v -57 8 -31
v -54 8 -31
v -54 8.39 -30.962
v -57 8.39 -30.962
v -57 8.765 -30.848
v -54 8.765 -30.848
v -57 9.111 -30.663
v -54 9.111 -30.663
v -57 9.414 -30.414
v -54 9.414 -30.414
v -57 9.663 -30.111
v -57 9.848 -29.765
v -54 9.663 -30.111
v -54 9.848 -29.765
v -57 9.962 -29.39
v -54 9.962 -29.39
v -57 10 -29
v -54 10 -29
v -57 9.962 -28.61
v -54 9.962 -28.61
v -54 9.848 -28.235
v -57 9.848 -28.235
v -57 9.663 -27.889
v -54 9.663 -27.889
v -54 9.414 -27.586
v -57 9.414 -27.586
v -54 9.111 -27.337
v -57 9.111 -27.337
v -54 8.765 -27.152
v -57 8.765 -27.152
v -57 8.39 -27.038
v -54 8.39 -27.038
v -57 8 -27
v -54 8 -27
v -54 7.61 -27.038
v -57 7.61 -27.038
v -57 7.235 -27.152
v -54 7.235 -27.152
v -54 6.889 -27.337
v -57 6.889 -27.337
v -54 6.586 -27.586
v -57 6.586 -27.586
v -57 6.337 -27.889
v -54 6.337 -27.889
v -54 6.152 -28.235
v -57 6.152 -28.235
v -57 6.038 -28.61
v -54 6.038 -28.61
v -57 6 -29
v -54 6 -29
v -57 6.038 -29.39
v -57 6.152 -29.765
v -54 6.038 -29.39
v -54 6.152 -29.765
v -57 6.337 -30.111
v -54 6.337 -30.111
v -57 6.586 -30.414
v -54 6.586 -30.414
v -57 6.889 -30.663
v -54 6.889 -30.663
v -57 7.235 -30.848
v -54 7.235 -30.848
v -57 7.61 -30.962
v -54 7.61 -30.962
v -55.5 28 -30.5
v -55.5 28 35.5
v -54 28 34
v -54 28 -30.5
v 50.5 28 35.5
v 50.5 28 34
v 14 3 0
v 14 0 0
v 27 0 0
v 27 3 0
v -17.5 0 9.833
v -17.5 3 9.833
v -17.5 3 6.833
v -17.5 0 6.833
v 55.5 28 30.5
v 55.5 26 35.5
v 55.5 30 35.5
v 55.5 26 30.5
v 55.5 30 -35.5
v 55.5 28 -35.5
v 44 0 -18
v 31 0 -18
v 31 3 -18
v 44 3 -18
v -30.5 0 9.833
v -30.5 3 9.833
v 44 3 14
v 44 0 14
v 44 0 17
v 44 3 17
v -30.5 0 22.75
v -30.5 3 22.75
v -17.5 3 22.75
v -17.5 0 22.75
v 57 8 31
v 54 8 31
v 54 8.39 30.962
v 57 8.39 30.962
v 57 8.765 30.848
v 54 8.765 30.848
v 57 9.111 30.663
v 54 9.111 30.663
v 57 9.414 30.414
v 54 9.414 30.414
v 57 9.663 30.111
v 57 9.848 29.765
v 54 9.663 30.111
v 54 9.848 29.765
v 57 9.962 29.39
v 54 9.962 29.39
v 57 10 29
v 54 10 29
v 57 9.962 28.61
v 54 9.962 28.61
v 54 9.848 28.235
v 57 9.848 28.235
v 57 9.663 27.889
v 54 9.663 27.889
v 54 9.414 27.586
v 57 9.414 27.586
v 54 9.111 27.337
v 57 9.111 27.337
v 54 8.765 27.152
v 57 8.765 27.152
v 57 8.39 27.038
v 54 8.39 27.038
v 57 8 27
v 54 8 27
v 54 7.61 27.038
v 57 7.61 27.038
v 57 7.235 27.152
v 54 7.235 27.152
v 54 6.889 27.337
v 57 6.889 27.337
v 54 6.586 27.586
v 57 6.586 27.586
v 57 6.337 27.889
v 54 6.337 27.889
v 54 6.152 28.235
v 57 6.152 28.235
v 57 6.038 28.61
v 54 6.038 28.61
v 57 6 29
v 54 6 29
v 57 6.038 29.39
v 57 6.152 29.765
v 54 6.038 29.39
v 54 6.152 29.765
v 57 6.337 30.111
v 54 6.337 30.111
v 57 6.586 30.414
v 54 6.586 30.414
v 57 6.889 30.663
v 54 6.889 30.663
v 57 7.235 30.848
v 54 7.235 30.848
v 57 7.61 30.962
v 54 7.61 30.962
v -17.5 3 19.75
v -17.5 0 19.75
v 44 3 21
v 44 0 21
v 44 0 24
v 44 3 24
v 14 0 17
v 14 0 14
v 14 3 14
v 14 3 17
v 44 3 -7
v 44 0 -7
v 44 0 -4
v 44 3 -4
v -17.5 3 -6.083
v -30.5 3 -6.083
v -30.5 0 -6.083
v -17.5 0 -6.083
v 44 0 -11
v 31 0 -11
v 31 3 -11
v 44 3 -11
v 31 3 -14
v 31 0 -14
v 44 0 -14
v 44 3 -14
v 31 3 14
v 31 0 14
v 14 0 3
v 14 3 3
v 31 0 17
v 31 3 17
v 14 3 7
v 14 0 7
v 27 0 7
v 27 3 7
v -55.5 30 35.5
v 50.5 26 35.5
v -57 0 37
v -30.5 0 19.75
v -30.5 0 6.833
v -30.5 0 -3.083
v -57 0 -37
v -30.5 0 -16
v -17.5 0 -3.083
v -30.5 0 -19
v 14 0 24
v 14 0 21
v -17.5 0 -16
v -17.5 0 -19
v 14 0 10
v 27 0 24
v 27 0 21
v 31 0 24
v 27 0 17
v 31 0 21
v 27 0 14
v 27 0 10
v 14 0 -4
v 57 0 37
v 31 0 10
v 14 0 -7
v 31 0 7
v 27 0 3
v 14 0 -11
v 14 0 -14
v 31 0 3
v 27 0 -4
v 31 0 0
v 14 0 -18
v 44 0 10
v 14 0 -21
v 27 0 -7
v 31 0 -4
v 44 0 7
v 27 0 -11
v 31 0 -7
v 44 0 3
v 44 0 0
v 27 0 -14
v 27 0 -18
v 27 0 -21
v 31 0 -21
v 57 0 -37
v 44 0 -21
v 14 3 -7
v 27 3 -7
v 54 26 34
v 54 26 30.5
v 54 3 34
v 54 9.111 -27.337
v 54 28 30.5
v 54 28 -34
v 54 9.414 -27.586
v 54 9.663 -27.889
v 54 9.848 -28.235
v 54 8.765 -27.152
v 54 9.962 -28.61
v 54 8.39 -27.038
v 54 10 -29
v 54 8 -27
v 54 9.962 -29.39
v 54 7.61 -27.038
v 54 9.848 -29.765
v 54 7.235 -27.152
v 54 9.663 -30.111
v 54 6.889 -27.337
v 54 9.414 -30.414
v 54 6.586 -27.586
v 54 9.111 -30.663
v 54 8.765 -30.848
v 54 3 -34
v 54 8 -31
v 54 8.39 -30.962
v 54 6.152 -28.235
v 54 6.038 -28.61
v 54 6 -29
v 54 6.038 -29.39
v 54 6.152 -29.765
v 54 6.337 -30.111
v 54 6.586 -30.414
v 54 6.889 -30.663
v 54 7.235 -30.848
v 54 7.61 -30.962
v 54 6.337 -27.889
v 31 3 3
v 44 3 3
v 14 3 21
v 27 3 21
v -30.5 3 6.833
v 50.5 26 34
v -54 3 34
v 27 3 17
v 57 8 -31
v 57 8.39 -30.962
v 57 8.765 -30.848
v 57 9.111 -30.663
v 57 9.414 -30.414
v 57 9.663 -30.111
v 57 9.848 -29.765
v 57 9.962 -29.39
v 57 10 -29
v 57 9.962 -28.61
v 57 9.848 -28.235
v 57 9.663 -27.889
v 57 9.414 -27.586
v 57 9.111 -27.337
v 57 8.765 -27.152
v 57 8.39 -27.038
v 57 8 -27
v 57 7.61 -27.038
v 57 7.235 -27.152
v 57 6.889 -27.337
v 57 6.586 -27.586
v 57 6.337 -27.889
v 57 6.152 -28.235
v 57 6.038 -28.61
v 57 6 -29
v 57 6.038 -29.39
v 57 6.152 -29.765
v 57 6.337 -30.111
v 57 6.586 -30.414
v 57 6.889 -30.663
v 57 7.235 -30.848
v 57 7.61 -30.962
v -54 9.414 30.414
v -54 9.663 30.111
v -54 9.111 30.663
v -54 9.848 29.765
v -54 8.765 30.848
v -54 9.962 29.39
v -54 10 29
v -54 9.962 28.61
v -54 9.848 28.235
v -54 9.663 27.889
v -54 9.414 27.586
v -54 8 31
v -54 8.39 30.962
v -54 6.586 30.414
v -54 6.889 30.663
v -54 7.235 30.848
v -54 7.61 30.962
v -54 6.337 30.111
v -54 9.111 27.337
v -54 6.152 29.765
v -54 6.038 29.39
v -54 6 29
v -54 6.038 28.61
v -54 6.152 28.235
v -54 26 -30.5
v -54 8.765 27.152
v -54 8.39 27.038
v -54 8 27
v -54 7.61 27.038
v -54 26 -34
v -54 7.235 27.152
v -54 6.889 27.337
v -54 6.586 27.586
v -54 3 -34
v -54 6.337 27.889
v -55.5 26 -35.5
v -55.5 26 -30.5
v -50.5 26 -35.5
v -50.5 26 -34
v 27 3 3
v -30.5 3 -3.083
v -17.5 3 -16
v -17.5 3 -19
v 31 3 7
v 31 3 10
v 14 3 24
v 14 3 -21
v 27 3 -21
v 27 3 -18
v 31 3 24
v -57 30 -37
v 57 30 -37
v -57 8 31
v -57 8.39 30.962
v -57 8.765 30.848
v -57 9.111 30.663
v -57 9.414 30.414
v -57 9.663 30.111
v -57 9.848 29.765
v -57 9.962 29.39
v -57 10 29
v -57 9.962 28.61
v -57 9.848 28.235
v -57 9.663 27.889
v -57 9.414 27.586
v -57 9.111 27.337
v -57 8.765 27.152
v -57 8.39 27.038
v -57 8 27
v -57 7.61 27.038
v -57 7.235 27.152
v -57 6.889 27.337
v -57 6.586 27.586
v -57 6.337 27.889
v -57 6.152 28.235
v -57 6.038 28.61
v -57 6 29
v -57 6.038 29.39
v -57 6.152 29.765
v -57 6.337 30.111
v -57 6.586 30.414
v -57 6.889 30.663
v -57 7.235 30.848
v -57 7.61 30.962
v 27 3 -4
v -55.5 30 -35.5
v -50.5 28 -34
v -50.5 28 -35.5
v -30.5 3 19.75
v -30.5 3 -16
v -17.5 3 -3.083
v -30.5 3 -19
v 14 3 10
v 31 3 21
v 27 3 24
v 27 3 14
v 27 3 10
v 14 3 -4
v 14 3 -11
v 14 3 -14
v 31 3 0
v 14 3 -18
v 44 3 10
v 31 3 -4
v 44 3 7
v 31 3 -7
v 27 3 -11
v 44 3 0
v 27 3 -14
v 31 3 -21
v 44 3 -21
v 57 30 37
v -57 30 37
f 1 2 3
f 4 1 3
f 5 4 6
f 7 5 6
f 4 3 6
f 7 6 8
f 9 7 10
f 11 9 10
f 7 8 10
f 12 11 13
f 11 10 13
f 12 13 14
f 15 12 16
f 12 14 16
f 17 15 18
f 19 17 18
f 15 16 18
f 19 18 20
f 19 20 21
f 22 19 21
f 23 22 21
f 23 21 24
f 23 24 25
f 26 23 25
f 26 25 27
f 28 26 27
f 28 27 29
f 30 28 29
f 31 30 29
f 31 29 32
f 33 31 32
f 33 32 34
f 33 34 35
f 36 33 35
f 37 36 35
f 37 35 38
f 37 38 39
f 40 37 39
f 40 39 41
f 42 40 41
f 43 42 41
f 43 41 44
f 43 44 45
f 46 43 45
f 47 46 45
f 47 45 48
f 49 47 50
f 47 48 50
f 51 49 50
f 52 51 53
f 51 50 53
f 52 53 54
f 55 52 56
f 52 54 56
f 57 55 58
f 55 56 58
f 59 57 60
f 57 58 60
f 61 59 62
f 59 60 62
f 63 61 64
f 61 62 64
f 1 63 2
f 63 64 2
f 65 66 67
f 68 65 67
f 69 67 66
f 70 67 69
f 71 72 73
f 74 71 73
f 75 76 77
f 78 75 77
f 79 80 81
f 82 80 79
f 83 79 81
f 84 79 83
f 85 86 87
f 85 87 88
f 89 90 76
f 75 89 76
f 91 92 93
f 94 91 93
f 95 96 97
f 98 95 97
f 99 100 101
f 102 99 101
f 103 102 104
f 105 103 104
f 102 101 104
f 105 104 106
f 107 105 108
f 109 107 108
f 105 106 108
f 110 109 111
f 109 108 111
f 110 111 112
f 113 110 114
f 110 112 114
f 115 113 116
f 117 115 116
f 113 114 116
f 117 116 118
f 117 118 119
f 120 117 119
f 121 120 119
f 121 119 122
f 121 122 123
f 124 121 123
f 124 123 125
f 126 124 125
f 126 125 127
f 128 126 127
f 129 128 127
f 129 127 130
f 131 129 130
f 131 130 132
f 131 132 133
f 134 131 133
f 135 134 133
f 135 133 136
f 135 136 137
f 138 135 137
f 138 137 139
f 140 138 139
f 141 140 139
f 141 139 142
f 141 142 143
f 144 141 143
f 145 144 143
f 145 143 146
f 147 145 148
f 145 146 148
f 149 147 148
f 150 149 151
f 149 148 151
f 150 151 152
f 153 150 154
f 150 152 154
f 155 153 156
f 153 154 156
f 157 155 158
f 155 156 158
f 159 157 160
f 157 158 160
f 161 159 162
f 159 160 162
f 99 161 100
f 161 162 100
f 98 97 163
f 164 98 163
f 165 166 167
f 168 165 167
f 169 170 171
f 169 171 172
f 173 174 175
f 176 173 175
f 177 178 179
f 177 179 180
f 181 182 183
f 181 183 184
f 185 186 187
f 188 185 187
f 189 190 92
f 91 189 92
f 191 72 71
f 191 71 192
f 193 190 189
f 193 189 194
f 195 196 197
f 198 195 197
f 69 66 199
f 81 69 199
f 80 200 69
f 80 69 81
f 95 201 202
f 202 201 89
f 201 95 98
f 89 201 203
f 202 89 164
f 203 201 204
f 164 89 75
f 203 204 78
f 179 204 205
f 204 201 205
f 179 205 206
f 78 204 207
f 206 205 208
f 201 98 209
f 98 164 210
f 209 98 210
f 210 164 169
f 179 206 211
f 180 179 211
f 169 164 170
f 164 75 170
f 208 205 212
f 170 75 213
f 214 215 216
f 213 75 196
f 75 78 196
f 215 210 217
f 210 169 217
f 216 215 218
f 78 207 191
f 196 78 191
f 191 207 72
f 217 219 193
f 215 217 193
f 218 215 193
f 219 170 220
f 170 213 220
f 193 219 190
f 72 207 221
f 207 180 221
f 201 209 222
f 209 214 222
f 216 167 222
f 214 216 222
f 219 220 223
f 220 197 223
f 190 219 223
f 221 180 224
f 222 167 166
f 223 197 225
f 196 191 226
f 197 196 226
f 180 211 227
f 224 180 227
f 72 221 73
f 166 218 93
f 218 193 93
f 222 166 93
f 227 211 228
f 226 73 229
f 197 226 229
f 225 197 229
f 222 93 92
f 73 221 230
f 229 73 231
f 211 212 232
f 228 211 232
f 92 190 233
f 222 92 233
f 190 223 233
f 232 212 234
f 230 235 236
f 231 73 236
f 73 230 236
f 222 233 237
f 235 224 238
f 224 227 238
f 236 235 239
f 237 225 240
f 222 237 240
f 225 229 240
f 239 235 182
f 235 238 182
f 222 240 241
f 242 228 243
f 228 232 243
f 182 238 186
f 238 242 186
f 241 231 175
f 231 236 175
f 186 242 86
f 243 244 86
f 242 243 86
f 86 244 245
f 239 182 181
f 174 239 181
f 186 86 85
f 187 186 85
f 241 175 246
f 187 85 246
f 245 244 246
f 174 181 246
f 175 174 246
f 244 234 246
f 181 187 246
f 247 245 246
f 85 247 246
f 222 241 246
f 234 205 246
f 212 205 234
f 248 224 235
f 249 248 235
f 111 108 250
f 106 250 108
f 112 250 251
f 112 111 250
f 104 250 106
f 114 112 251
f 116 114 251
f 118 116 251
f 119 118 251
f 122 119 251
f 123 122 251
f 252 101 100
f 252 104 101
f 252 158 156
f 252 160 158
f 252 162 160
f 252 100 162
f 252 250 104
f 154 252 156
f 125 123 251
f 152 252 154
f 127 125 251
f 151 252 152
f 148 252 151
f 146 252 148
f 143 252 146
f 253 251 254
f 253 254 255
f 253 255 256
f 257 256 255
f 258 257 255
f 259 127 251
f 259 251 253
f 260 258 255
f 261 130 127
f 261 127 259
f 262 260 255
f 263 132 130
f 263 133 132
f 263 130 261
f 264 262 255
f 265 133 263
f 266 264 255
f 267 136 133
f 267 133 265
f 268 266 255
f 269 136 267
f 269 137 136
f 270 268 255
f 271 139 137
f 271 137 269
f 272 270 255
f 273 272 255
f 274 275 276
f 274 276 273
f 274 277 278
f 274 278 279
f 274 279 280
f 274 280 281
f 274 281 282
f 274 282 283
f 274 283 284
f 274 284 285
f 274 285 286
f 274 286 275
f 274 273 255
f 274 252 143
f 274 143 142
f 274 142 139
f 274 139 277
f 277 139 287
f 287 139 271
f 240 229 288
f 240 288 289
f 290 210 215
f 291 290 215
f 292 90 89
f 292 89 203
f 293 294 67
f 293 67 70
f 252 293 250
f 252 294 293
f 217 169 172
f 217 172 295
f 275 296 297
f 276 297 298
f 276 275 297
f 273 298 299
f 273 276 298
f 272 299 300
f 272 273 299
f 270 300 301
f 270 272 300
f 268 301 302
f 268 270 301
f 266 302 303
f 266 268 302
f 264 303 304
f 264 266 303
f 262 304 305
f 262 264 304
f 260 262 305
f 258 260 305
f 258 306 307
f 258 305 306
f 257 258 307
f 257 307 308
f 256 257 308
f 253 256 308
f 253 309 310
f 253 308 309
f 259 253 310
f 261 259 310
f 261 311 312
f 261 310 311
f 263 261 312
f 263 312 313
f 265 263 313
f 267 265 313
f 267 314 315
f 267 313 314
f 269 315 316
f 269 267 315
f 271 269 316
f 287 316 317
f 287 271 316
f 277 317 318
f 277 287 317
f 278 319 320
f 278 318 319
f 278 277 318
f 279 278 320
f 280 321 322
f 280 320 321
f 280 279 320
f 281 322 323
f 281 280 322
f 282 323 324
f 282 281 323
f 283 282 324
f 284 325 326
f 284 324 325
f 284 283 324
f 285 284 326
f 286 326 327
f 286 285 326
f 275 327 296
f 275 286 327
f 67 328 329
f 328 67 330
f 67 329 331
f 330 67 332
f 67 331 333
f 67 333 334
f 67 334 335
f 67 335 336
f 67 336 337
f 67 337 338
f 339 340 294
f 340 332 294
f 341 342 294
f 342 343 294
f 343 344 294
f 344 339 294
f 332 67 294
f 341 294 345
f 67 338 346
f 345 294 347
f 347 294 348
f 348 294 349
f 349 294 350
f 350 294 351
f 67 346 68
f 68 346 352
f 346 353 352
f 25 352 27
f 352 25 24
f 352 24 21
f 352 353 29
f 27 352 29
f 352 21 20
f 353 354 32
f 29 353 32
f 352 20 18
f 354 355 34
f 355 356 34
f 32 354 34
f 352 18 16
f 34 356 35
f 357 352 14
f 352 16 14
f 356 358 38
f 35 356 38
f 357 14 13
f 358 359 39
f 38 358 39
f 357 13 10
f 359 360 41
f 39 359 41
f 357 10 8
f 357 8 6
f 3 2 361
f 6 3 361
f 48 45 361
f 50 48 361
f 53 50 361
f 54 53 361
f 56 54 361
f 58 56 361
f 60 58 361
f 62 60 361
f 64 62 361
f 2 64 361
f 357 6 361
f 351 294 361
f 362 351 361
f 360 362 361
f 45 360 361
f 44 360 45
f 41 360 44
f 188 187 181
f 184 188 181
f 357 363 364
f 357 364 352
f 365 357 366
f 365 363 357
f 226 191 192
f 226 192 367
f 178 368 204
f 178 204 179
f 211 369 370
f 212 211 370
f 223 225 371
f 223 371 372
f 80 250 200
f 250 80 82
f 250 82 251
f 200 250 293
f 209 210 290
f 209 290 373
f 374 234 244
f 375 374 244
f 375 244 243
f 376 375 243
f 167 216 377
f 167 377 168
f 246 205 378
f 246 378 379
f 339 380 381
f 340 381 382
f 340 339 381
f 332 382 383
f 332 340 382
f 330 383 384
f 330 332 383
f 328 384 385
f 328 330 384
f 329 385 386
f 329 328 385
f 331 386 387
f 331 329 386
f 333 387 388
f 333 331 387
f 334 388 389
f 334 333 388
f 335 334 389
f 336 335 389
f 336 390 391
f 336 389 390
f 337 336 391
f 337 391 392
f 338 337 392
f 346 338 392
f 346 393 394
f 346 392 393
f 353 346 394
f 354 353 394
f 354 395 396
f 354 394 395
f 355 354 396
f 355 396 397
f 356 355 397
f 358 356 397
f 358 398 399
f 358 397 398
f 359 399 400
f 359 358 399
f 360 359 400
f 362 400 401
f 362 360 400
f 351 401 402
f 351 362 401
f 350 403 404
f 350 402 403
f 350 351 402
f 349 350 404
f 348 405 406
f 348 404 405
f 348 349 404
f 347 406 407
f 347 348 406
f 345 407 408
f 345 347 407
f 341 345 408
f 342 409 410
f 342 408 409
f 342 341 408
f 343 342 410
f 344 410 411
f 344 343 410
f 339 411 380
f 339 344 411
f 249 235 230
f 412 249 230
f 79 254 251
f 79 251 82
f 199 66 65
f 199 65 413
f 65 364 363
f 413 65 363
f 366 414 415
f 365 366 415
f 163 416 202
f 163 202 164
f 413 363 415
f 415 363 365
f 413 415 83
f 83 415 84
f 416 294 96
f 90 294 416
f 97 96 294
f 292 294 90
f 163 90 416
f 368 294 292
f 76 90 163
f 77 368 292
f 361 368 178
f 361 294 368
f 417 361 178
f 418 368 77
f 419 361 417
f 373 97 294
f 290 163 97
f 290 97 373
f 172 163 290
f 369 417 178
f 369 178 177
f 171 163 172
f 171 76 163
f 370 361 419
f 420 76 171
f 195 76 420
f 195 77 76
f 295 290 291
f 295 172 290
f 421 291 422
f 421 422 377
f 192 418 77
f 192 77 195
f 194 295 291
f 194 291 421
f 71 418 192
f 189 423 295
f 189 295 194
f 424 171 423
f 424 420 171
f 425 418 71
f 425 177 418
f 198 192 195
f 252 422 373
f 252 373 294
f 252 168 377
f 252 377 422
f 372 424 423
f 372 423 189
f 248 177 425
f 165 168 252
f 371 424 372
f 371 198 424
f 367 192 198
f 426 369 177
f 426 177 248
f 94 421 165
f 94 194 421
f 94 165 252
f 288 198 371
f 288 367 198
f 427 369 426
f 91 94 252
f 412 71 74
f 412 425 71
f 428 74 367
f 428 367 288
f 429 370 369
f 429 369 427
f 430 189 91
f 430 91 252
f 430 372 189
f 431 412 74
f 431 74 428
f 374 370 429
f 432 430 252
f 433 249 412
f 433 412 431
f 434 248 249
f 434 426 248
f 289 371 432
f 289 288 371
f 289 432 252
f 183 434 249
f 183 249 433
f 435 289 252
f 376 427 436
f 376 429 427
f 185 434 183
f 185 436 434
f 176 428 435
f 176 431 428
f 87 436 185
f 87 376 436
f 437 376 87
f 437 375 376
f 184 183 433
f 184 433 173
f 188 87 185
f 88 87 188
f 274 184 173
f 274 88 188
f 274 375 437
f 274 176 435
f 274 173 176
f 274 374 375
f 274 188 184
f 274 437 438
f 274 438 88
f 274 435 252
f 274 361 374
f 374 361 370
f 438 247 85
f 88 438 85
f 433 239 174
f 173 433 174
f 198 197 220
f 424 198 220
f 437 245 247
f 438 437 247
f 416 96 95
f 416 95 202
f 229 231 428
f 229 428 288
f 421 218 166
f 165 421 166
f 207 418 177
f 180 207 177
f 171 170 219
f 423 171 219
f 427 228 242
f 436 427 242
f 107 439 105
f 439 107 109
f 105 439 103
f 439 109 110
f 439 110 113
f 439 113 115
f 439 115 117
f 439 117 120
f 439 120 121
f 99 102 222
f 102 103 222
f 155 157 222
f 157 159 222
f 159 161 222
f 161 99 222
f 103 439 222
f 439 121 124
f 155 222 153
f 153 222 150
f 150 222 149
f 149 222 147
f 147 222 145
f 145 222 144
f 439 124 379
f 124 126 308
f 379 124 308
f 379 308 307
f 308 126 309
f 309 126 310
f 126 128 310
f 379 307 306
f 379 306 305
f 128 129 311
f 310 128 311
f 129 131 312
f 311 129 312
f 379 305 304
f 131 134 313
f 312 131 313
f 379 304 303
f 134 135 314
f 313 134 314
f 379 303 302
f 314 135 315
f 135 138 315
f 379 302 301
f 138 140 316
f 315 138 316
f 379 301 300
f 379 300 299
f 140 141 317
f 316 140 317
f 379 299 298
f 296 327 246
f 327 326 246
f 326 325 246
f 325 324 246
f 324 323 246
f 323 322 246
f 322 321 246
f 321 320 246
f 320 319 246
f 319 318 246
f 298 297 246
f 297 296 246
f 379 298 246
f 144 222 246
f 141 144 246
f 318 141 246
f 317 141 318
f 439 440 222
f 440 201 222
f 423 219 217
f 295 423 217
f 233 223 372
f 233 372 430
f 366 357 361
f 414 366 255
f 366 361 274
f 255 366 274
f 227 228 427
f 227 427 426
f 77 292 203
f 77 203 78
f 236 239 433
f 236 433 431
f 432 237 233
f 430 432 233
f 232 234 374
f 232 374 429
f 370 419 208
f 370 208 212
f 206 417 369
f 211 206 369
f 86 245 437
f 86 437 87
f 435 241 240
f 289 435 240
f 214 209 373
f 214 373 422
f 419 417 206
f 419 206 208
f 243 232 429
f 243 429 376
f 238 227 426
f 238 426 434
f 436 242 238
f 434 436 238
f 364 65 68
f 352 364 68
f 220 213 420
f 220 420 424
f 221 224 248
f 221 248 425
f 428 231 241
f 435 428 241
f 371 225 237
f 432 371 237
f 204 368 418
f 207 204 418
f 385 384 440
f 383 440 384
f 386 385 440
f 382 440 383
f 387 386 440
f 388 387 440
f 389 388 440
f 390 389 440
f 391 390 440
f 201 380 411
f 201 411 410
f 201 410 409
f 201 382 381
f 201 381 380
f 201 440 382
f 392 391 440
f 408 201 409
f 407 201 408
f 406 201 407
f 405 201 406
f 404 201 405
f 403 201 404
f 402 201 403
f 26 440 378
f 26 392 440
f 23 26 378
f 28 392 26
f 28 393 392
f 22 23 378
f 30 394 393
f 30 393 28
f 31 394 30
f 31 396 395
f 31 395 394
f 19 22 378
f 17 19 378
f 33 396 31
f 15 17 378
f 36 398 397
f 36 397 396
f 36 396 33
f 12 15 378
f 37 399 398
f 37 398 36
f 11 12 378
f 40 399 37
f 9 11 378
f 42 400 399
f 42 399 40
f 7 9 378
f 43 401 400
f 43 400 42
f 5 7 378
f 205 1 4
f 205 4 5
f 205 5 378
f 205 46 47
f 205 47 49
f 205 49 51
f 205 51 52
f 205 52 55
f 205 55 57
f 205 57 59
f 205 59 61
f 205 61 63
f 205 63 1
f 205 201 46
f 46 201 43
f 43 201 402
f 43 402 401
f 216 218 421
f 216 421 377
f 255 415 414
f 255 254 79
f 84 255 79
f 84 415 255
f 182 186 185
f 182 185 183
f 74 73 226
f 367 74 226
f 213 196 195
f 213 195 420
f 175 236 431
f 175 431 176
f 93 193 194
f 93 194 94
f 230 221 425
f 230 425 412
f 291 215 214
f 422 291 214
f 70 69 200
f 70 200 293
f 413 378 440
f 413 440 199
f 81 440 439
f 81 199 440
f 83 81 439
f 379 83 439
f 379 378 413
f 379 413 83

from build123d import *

# Parameters (mm, degrees)
SKETCH1_W                = 108
SKETCH1_H                = 68
BOSS_EXTRUDE1_DEPTH      = 3
SKETCH2_W                = 114
SKETCH2_H                = 74
SKETCH2_W_2              = 108
SKETCH2_H_2              = 68
BOSS_EXTRUDE2_DEPTH      = 25
BOSS_EXTRUDE2_DEPTH_BACK = 3
SKETCH4_W                = 114
SKETCH4_H                = 74
SKETCH4_W_2              = 111
SKETCH4_H_2              = 71
BOSS_EXTRUDE3_DEPTH      = 2
SKETCH5_R                = 2
CUT_EXTRUDE1_DEPTH       = 4
SKETCH6_W                = 13
SKETCH6_H                = 3
CUT_EXTRUDE2_DEPTH       = 31
MIRROR2_COPY_1_SKETCH_R  = 2
MIRROR2_COPY_1_DEPTH     = 4
SKETCH7_W                = 13
SKETCH7_H                = 3
CUT_EXTRUDE3_DEPTH       = 10
CUT_EXTRUDE4_DEPTH       = 2


with BuildPart() as part:
    # Sketch1 → Boss-Extrude1 (new body)
    with BuildSketch(Plane(origin=(0, 0, 0), x_dir=(1, 0, 0), z_dir=(0, 1, 0))):
        Rectangle(SKETCH1_W, SKETCH1_H)
    extrude(amount=BOSS_EXTRUDE1_DEPTH)

    # Sketch2 → Boss-Extrude2 (add, two sides)
    with BuildSketch(Plane(origin=(0, 3, 0), x_dir=(1, 0, 0), z_dir=(0, 1, 0))) as boss_extrude2_sk:
        Rectangle(SKETCH2_W, SKETCH2_H)
        Rectangle(SKETCH2_W_2, SKETCH2_H_2, mode=Mode.SUBTRACT)
    extrude(amount=BOSS_EXTRUDE2_DEPTH)
    extrude(boss_extrude2_sk.sketch, amount=-BOSS_EXTRUDE2_DEPTH_BACK)

    # Sketch4 → Boss-Extrude3 (add)
    with BuildSketch(Plane(origin=(0, 28, 0), x_dir=(1, 0, 0), z_dir=(0, 1, 0))):
        Rectangle(SKETCH4_W, SKETCH4_H)
        Rectangle(SKETCH4_W_2, SKETCH4_H_2, mode=Mode.SUBTRACT)
    extrude(amount=BOSS_EXTRUDE3_DEPTH)

    # Sketch5 → Cut-Extrude1 (cut, through all)
    with BuildSketch(Plane(origin=(-54, 0, 0), x_dir=(0, 0, -1), z_dir=(1, 0, 0))):
        with Locations((29, 8)):
            Circle(SKETCH5_R)
    cut_extrude1 = extrude(amount=-CUT_EXTRUDE1_DEPTH, mode=Mode.SUBTRACT)

    # Sketch6 → Cut-Extrude2 (cut, through all)
    with BuildSketch(Plane.XZ):
        with Locations((20.5, 22.5)):
            Rectangle(SKETCH6_W, SKETCH6_H)
        with Locations((37.5, 22.5)):
            Rectangle(SKETCH6_W, SKETCH6_H)
        with Locations((20.5, 15.5)):
            Rectangle(SKETCH6_W, SKETCH6_H)
        with Locations((37.5, 15.5)):
            Rectangle(SKETCH6_W, SKETCH6_H)
        with Locations((20.5, 8.5)):
            Rectangle(SKETCH6_W, SKETCH6_H)
        with Locations((37.5, 8.5)):
            Rectangle(SKETCH6_W, SKETCH6_H)
        with Locations((20.5, 1.5)):
            Rectangle(SKETCH6_W, SKETCH6_H)
        with Locations((37.5, 1.5)):
            Rectangle(SKETCH6_W, SKETCH6_H)
        with Locations((20.5, -5.5)):
            Rectangle(SKETCH6_W, SKETCH6_H)
        with Locations((37.5, -5.5)):
            Rectangle(SKETCH6_W, SKETCH6_H)
        with Locations((20.5, -12.5)):
            Rectangle(SKETCH6_W, SKETCH6_H)
        with Locations((37.5, -12.5)):
            Rectangle(SKETCH6_W, SKETCH6_H)
        with Locations((20.5, -19.5)):
            Rectangle(SKETCH6_W, SKETCH6_H)
        with Locations((37.5, -19.5)):
            Rectangle(SKETCH6_W, SKETCH6_H)
    extrude(amount=-CUT_EXTRUDE2_DEPTH, mode=Mode.SUBTRACT)

    # Mirror1: Cut-Extrude1 across plane
    add(cut_extrude1.mirror(Plane.XY), mode=Mode.SUBTRACT)

    # Mirror2: Cut-Extrude1 across plane
    add(cut_extrude1.mirror(Plane(origin=(0, 0, 0), x_dir=(0, 0, 1), z_dir=(1, 0, 0))), mode=Mode.SUBTRACT)

    # Mirror2 copy 1 sketch → Mirror2 copy 1 (cut, through all)
    with BuildSketch(Plane.ZY.offset(-54)):
        with Locations((29, 8)):
            Circle(MIRROR2_COPY_1_SKETCH_R)
    extrude(amount=-MIRROR2_COPY_1_DEPTH, mode=Mode.SUBTRACT)

    # Sketch7 → Cut-Extrude3 (cut)
    with BuildSketch(Plane(origin=(0, 3, 0), x_dir=(1, 0, 0), z_dir=(0, 1, 0))):
        with Locations((-24, 17.5)):
            Rectangle(SKETCH7_W, SKETCH7_H)
        with Locations((-24, 4.583391615)):
            Rectangle(SKETCH7_W, SKETCH7_H)
        with Locations((-24, -8.333216771)):
            Rectangle(SKETCH7_W, SKETCH7_H)
        with Locations((-24, -21.249825156)):
            Rectangle(SKETCH7_W, SKETCH7_H)
    extrude(amount=-CUT_EXTRUDE3_DEPTH, mode=Mode.SUBTRACT)

    # Sketch8 → Cut-Extrude4 (cut)
    with BuildSketch(Plane(origin=(0, 28, 0), x_dir=(1, 0, 0), z_dir=(0, 1, 0))):
        Polygon((-54, 34), (-50.5, 34), (-50.5, 35.5), (-55.5, 35.5), (-55.5, 30.5), (-54, 30.5), align=None)
        Polygon((54, -34), (54, -30.5), (55.5, -30.5), (55.5, -35.5), (50.5, -35.5), (50.5, -34), align=None)
    extrude(amount=-CUT_EXTRUDE4_DEPTH, mode=Mode.SUBTRACT)


solid = part.part
